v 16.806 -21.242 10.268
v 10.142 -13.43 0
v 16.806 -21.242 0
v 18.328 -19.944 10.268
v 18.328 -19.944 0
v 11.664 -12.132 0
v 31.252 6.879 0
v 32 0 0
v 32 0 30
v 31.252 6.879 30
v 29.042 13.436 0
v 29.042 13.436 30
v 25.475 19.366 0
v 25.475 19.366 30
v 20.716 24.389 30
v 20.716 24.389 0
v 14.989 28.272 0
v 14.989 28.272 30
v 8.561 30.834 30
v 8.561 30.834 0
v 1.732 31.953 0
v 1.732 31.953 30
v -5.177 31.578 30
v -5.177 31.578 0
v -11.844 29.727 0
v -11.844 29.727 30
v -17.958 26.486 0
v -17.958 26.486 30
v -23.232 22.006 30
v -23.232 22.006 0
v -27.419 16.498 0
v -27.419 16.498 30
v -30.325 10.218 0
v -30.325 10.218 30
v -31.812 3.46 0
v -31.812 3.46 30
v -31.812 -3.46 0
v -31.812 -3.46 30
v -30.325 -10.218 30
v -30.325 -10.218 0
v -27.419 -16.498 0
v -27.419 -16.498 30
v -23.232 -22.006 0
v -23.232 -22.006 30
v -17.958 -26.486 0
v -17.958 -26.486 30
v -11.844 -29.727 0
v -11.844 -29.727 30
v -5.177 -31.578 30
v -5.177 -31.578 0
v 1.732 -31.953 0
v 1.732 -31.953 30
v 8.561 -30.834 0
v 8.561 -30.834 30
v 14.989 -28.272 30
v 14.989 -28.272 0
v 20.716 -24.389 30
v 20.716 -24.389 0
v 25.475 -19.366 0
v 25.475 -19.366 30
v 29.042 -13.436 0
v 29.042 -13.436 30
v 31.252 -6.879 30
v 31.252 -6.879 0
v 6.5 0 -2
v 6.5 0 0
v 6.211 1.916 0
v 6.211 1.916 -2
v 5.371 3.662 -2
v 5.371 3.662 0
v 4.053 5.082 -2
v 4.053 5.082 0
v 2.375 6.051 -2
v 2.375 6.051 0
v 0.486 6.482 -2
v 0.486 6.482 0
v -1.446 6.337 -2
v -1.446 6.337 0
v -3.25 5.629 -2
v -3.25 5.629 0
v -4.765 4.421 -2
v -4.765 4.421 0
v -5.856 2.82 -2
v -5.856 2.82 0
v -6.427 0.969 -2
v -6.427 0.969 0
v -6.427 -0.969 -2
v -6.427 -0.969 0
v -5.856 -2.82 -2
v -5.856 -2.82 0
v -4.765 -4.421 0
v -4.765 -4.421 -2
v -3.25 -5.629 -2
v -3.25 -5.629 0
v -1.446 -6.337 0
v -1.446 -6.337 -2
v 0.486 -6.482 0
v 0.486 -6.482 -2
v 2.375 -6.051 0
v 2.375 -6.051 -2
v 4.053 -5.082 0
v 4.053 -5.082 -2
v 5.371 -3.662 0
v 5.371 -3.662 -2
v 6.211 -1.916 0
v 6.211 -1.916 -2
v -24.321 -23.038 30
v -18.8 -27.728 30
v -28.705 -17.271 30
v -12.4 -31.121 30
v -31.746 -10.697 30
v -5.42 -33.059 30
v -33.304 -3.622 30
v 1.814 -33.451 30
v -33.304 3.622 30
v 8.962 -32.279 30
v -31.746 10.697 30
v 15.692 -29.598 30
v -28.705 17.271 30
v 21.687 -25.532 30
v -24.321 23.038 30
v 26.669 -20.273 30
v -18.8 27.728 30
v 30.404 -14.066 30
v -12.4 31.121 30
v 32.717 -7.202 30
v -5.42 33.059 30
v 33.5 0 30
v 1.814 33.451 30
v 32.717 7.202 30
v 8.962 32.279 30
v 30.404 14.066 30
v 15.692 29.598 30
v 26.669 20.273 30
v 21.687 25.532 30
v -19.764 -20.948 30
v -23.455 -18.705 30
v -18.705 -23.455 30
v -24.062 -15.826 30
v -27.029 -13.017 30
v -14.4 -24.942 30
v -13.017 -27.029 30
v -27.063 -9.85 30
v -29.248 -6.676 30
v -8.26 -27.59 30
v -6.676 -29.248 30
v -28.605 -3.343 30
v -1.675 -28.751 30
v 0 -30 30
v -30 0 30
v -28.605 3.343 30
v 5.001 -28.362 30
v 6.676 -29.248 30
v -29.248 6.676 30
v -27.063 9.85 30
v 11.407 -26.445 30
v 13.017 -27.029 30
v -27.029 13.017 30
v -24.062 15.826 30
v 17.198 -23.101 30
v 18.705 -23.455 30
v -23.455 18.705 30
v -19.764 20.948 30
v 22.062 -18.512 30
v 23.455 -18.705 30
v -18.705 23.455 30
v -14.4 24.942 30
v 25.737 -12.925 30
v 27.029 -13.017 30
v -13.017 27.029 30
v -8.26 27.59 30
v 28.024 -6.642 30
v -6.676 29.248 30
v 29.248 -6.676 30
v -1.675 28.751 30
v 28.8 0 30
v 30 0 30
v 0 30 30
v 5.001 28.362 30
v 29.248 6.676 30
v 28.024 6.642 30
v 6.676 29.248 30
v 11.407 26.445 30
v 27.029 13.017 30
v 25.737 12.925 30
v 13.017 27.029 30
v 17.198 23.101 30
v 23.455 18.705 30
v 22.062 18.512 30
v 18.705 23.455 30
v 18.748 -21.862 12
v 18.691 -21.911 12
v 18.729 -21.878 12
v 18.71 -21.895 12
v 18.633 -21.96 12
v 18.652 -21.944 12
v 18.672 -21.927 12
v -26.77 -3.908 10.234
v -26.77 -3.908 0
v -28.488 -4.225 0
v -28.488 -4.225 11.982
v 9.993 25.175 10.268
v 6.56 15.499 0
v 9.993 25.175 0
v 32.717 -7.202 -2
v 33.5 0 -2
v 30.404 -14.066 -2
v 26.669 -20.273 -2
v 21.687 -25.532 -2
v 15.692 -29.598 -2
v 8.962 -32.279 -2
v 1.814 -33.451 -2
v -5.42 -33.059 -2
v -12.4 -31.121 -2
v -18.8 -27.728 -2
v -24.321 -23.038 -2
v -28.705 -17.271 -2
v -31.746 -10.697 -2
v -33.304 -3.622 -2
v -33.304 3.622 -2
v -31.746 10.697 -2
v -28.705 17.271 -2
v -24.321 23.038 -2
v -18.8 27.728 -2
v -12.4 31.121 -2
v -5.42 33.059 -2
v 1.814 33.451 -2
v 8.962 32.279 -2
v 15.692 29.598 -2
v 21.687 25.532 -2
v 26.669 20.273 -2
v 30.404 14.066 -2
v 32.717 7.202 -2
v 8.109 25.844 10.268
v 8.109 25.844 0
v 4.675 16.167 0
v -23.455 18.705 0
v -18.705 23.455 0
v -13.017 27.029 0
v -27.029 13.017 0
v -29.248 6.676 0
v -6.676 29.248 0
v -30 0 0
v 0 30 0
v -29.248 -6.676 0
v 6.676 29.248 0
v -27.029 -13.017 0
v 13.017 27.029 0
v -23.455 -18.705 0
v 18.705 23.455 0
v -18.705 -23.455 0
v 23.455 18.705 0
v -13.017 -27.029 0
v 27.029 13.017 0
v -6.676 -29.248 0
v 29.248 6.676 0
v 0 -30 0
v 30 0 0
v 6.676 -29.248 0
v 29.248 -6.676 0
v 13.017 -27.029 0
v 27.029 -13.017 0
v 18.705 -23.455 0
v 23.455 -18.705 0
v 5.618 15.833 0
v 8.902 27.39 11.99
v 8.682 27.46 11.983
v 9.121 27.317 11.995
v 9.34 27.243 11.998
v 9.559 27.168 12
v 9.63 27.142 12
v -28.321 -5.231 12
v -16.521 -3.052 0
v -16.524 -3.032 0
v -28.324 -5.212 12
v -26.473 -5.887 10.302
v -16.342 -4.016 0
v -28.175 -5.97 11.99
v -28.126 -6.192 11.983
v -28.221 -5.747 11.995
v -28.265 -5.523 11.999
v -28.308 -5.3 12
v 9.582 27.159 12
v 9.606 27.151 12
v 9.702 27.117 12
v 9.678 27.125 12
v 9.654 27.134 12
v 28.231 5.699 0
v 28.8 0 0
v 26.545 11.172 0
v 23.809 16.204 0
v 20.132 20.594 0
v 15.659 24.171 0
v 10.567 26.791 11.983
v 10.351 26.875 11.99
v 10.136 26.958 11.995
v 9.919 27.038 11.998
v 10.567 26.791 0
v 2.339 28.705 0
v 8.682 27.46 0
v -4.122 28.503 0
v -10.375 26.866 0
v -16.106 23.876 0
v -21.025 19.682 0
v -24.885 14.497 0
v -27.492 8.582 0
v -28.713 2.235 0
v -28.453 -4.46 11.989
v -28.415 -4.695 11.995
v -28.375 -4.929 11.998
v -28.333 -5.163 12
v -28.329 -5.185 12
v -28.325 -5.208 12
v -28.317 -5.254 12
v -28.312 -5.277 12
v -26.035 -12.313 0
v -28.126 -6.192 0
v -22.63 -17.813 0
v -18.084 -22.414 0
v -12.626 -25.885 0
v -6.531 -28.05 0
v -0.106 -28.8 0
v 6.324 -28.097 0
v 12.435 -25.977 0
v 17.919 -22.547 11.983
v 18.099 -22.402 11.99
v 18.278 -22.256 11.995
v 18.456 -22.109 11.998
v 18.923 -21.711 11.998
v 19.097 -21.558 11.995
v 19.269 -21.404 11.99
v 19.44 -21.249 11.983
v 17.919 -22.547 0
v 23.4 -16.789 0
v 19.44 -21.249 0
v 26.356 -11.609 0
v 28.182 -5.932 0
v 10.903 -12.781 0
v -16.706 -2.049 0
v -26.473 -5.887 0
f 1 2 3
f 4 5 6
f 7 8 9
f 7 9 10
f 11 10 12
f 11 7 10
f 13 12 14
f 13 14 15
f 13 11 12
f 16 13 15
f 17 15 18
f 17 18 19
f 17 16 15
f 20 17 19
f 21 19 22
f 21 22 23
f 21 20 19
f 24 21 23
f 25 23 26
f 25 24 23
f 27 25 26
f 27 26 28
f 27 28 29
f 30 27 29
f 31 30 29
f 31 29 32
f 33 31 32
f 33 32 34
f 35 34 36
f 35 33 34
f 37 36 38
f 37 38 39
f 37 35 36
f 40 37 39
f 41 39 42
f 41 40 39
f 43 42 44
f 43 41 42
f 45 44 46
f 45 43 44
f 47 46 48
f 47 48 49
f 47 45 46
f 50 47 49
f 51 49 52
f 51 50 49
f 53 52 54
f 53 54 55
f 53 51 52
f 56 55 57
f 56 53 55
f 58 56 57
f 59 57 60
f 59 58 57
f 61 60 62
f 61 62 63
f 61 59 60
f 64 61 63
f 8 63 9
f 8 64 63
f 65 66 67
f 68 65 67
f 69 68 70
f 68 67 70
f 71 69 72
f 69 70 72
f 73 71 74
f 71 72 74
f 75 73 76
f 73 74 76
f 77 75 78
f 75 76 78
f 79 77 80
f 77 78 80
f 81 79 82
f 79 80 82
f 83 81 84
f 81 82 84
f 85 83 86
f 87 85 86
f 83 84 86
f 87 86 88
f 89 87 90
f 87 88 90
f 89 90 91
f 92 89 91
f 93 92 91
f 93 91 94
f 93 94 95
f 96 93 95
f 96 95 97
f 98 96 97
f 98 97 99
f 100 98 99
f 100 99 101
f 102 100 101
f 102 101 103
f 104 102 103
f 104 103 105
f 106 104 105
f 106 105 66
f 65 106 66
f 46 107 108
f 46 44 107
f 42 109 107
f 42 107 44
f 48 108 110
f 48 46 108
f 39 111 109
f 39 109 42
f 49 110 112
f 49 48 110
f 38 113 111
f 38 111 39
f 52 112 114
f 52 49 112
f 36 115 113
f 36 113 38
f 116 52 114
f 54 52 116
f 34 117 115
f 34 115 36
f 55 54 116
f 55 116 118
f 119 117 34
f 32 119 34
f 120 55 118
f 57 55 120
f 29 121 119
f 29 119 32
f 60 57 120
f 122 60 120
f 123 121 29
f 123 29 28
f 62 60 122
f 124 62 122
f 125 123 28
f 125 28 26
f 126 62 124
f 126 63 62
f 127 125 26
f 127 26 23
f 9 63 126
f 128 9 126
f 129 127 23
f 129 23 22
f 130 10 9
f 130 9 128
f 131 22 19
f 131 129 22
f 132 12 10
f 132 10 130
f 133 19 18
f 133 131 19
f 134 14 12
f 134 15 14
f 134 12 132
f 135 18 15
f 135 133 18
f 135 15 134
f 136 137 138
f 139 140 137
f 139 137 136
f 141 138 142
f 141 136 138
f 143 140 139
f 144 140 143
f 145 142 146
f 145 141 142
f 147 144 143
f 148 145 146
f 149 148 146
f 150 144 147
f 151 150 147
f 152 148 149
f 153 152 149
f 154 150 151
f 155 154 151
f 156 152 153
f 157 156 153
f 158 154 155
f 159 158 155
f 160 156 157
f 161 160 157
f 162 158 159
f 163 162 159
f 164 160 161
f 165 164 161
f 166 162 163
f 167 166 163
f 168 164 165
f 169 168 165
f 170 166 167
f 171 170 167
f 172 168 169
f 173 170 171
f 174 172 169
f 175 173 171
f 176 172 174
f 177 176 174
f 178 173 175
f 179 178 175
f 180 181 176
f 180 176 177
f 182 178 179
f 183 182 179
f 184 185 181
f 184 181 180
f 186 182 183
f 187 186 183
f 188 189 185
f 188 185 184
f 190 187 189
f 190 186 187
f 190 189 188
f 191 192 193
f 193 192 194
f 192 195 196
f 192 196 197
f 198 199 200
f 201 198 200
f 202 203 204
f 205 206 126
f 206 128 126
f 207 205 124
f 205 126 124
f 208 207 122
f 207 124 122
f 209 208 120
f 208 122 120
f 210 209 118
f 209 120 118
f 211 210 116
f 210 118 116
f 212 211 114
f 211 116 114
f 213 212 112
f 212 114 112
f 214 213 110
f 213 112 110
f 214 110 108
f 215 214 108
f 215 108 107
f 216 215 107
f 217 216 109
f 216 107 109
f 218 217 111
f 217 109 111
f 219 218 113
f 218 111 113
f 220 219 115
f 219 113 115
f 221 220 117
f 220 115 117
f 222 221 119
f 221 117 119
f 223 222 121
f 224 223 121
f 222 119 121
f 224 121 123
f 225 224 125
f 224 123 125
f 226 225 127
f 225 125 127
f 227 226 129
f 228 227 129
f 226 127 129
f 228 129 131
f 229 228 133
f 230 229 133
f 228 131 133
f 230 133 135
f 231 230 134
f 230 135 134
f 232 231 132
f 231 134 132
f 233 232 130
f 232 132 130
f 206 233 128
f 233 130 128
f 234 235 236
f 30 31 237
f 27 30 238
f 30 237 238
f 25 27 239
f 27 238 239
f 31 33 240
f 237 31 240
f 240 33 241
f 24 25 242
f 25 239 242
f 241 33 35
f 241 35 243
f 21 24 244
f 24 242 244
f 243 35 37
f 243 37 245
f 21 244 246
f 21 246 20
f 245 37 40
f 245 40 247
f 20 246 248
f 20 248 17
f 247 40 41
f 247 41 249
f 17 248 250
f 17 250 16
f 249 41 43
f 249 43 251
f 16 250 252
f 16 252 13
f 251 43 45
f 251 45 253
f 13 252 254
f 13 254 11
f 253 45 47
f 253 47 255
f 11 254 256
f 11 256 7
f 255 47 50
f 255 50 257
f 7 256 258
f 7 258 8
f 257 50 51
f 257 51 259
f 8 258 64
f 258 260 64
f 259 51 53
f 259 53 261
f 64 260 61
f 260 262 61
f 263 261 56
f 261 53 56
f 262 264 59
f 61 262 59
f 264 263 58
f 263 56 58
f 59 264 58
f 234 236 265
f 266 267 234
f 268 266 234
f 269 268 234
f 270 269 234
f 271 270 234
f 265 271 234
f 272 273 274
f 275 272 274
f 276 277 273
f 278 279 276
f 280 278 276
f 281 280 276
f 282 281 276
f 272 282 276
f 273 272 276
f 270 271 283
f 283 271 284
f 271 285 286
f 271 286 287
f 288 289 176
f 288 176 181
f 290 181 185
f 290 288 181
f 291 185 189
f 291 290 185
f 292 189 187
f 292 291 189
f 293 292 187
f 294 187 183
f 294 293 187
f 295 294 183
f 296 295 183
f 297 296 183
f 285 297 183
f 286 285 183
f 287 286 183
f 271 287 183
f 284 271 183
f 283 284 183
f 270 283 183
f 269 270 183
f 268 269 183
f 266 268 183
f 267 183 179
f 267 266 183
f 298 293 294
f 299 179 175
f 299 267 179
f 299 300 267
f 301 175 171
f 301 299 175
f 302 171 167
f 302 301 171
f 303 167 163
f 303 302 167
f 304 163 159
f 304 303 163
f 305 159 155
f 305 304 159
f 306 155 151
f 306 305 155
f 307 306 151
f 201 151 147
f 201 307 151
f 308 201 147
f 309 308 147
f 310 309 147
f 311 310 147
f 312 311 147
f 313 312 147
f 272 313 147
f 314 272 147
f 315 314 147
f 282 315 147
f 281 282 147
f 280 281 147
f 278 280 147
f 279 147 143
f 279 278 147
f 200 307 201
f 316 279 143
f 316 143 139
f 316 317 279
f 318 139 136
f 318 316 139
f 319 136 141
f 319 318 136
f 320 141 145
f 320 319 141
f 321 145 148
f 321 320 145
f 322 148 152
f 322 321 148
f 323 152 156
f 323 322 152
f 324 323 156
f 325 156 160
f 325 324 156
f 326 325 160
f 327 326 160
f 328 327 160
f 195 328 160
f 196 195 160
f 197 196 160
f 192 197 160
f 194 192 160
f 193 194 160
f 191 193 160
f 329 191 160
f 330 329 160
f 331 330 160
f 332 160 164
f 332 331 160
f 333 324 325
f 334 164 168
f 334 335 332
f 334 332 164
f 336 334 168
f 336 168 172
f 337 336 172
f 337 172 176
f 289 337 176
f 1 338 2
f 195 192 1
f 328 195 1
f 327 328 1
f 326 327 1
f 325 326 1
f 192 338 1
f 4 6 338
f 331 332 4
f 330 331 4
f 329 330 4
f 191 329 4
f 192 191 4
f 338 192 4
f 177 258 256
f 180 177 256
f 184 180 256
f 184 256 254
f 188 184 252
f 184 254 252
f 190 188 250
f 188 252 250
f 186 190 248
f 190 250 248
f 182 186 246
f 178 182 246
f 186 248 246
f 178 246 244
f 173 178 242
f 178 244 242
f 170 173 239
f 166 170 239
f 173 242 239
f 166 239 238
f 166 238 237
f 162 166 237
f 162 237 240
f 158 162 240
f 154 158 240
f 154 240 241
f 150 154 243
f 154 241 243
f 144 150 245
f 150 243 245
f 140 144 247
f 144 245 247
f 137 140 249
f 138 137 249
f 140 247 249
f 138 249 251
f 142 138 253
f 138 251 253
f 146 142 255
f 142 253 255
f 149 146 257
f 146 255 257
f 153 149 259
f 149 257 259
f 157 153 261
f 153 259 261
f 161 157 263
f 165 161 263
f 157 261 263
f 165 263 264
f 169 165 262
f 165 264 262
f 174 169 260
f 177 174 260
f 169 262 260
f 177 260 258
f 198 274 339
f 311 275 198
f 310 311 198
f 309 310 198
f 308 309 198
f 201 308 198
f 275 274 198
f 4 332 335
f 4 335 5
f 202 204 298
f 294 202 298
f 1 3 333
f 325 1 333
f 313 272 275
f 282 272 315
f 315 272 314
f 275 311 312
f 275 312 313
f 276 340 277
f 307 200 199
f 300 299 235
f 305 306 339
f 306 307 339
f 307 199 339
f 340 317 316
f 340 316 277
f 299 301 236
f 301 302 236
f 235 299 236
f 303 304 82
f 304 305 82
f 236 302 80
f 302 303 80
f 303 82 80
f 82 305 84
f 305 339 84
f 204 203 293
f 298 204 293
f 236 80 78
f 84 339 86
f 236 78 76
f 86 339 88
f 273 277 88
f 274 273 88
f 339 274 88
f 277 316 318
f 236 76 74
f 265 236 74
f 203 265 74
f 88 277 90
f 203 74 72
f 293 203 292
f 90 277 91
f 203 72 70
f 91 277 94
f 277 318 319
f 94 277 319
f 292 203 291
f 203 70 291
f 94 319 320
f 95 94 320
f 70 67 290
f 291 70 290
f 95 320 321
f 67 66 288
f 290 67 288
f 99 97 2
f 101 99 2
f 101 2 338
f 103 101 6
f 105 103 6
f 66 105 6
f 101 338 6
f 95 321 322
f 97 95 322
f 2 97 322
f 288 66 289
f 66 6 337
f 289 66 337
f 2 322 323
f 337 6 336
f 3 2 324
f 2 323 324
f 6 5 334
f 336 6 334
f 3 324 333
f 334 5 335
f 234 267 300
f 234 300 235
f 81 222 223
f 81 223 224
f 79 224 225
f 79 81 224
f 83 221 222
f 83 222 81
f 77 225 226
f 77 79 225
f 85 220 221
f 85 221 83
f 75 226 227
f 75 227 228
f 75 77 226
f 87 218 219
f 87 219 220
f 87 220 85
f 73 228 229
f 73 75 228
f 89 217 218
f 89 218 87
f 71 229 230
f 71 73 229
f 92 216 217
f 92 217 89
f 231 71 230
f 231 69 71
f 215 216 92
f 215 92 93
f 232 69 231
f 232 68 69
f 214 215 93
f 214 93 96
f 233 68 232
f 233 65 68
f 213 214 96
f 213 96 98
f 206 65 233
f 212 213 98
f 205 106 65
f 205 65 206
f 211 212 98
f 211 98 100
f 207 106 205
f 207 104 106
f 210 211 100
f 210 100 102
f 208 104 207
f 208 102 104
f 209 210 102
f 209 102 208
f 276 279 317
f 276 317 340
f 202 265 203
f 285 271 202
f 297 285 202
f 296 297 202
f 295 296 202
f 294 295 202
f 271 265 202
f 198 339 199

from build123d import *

# Parameters (mm, degrees)
F0_R      = 33.5
F0_R_2    = 32
F1_DEPTH  = 30
F0_R_3    = 30
F0_R_4    = 28.8
F2_R      = 33.5
F3_DEPTH  = 2
F5_DEPTH  = 12
F6_SIZE   = 11.9999
F6_2_SIZE = 11.9999
F6_3_SIZE = 11.9999
F8_R      = 6.5
F9_DEPTH  = 25


# Not quite as in the source:
# - a fillet or chamfer is up to 0.001 mm smaller than in the source, because OpenCascade refuses the exact size


with BuildPart() as f1:
    # F0 (on Top) → F1 (new body)
    with BuildSketch(Plane.XY):
        Circle(F0_R)
        Circle(F0_R_2, mode=Mode.SUBTRACT)
    extrude(amount=F1_DEPTH)


with BuildPart() as f1b:
    # F0 (on Top) → F1, piece 2 (new body)
    with BuildSketch(Plane.XY):
        Circle(F0_R_3)
        Circle(F0_R_4, mode=Mode.SUBTRACT)
    extrude(amount=F1_DEPTH)


with BuildPart() as f3:
    # F2 (on face) → F3 (new body)
    with BuildSketch(Plane(origin=(0, 0, 0), x_dir=(1, 0, 0), z_dir=(0, 0, -1))):
        Circle(F2_R)
    extrude(amount=F3_DEPTH)


with BuildPart() as f5:
    # F4 (on face) → F5 (new body)
    with BuildSketch(Plane.XY):
        with BuildLine():
            Line((9.993418715, 25.1754931604), (10.5667748746, 26.7914775395))
            ThreePointArc((10.5667748746, 26.7914775395), (10.0999818657, 26.9709170462), (9.630143492, 27.1422242332))
            Line((9.630143492, 27.1422242332), (9.993418715, 25.1754931604))
        make_face()
        with BuildLine():
            Line((8.1085420321, 25.8442531252), (9.630143492, 27.1422242332))
            ThreePointArc((9.630143492, 27.1422242332), (9.15740142, 27.3053474476), (8.6818981918, 27.4602375042))
            Line((8.6818981918, 27.4602375042), (8.1085420321, 25.8442531252))
        make_face()
        Polygon((9.993418715, 25.1754931604), (9.630143492, 27.1422242332), (5.6175837037, 15.832964136), (6.5600220451, 15.4985841536), align=None)
        Polygon((5.6175837037, 15.832964136), (9.630143492, 27.1422242332), (8.1085420321, 25.8442531252), (4.6751453622, 16.1673441184), align=None)
    extrude(amount=F5_DEPTH)

    # F6#2 (size 12 in the source; OpenCascade refuses exactly that, so slightly less here)
    f6_2_edges = [f5.edges().sort_by_distance(p)[0] for p in [
        (5.617584, 15.832964, 12),
    ]]
    chamfer(f6_2_edges, length=F6_2_SIZE)


with BuildPart() as f5b:
    # F4 (on face) → F5, piece 2 (new body)
    with BuildSketch(Plane.XY):
        with BuildLine():
            Line((-26.769701888, -3.9079218685), (-28.488352252, -4.2253740625))
            ThreePointArc((-28.488352252, -4.2253740625), (-28.4090912902, -4.7290096283), (-28.3209274471, -5.2311632104))
            Line((-28.3209274471, -5.2311632104), (-26.769701888, -3.9079218685))
        make_face()
        with BuildLine():
            ThreePointArc((-28.3209274471, -5.2311632104), (-28.2277588918, -5.7125850495), (-28.1264073572, -6.1923508604))
            Line((-28.1264073572, -6.1923508604), (-26.4727474785, -5.8869030696))
            Line((-26.4727474785, -5.8869030696), (-28.3209274471, -5.2311632104))
        make_face()
        Polygon((-16.7057304605, -2.0490040353), (-26.769701888, -3.9079218685), (-28.3209274471, -5.2311632104), (-16.5205565416, -3.0515147414), (-16.5240928491, -3.0323695717), align=None)
        Polygon((-28.3209274471, -5.2311632104), (-26.4727474785, -5.8869030696), (-16.3424552376, -4.0157351081), (-16.5205565416, -3.0515147414), align=None)
    extrude(amount=F5_DEPTH)

    # F6 (size 12 in the source; OpenCascade refuses exactly that, so slightly less here)
    f6_edges = [f5b.edges().sort_by_distance(p)[0] for p in [
        (-16.524093, -3.03237, 12),
    ]]
    chamfer(f6_edges, length=F6_SIZE)


with BuildPart() as f5c:
    # F4 (on face) → F5, piece 3 (new body)
    with BuildSketch(Plane.XY):
        with BuildLine():
            ThreePointArc((17.9187127168, -22.5468342472), (18.3075083925, -22.2322993966), (18.6907839551, -21.9110610228))
            Line((18.6907839551, -21.9110610228), (16.8059072723, -21.242301058))
            Line((16.8059072723, -21.242301058), (17.9187127168, -22.5468342472))
        make_face()
        with BuildLine():
            ThreePointArc((18.6907839551, -21.9110610228), (19.0684238388, -21.5832159862), (19.4403141767, -21.2488631392))
            Line((19.4403141767, -21.2488631392), (18.3275087322, -19.94432995))
            Line((18.3275087322, -19.94432995), (18.6907839551, -21.9110610228))
        make_face()
        Polygon((10.9029573072, -12.7814522633), (18.6907839551, -21.9110610228), (18.3275087322, -19.94432995), (11.6637580371, -12.1324667093), align=None)
        Polygon((16.8059072723, -21.242301058), (18.6907839551, -21.9110610228), (10.9029573072, -12.7814522633), (10.1421565772, -13.4304378173), align=None)
    extrude(amount=F5_DEPTH)

    # F6#3 (size 12 in the source; OpenCascade refuses exactly that, so slightly less here)
    f6_3_edges = [f5c.edges().sort_by_distance(p)[0] for p in [
        (10.902957, -12.781452, 12),
    ]]
    chamfer(f6_3_edges, length=F6_3_SIZE)


with BuildPart() as f5_1:
    add(f5.part)

    # F7: union F1b, F1, F3, F5b, F5c
    add(f1b.part)
    add(f1.part)
    add(f3.part)
    add(f5b.part)
    add(f5c.part)

    # F8 (on face) → F9 (cut)
    with BuildSketch(Plane.XY):
        Circle(F8_R)
    extrude(amount=-F9_DEPTH, mode=Mode.SUBTRACT)


solid = f5_1.part
